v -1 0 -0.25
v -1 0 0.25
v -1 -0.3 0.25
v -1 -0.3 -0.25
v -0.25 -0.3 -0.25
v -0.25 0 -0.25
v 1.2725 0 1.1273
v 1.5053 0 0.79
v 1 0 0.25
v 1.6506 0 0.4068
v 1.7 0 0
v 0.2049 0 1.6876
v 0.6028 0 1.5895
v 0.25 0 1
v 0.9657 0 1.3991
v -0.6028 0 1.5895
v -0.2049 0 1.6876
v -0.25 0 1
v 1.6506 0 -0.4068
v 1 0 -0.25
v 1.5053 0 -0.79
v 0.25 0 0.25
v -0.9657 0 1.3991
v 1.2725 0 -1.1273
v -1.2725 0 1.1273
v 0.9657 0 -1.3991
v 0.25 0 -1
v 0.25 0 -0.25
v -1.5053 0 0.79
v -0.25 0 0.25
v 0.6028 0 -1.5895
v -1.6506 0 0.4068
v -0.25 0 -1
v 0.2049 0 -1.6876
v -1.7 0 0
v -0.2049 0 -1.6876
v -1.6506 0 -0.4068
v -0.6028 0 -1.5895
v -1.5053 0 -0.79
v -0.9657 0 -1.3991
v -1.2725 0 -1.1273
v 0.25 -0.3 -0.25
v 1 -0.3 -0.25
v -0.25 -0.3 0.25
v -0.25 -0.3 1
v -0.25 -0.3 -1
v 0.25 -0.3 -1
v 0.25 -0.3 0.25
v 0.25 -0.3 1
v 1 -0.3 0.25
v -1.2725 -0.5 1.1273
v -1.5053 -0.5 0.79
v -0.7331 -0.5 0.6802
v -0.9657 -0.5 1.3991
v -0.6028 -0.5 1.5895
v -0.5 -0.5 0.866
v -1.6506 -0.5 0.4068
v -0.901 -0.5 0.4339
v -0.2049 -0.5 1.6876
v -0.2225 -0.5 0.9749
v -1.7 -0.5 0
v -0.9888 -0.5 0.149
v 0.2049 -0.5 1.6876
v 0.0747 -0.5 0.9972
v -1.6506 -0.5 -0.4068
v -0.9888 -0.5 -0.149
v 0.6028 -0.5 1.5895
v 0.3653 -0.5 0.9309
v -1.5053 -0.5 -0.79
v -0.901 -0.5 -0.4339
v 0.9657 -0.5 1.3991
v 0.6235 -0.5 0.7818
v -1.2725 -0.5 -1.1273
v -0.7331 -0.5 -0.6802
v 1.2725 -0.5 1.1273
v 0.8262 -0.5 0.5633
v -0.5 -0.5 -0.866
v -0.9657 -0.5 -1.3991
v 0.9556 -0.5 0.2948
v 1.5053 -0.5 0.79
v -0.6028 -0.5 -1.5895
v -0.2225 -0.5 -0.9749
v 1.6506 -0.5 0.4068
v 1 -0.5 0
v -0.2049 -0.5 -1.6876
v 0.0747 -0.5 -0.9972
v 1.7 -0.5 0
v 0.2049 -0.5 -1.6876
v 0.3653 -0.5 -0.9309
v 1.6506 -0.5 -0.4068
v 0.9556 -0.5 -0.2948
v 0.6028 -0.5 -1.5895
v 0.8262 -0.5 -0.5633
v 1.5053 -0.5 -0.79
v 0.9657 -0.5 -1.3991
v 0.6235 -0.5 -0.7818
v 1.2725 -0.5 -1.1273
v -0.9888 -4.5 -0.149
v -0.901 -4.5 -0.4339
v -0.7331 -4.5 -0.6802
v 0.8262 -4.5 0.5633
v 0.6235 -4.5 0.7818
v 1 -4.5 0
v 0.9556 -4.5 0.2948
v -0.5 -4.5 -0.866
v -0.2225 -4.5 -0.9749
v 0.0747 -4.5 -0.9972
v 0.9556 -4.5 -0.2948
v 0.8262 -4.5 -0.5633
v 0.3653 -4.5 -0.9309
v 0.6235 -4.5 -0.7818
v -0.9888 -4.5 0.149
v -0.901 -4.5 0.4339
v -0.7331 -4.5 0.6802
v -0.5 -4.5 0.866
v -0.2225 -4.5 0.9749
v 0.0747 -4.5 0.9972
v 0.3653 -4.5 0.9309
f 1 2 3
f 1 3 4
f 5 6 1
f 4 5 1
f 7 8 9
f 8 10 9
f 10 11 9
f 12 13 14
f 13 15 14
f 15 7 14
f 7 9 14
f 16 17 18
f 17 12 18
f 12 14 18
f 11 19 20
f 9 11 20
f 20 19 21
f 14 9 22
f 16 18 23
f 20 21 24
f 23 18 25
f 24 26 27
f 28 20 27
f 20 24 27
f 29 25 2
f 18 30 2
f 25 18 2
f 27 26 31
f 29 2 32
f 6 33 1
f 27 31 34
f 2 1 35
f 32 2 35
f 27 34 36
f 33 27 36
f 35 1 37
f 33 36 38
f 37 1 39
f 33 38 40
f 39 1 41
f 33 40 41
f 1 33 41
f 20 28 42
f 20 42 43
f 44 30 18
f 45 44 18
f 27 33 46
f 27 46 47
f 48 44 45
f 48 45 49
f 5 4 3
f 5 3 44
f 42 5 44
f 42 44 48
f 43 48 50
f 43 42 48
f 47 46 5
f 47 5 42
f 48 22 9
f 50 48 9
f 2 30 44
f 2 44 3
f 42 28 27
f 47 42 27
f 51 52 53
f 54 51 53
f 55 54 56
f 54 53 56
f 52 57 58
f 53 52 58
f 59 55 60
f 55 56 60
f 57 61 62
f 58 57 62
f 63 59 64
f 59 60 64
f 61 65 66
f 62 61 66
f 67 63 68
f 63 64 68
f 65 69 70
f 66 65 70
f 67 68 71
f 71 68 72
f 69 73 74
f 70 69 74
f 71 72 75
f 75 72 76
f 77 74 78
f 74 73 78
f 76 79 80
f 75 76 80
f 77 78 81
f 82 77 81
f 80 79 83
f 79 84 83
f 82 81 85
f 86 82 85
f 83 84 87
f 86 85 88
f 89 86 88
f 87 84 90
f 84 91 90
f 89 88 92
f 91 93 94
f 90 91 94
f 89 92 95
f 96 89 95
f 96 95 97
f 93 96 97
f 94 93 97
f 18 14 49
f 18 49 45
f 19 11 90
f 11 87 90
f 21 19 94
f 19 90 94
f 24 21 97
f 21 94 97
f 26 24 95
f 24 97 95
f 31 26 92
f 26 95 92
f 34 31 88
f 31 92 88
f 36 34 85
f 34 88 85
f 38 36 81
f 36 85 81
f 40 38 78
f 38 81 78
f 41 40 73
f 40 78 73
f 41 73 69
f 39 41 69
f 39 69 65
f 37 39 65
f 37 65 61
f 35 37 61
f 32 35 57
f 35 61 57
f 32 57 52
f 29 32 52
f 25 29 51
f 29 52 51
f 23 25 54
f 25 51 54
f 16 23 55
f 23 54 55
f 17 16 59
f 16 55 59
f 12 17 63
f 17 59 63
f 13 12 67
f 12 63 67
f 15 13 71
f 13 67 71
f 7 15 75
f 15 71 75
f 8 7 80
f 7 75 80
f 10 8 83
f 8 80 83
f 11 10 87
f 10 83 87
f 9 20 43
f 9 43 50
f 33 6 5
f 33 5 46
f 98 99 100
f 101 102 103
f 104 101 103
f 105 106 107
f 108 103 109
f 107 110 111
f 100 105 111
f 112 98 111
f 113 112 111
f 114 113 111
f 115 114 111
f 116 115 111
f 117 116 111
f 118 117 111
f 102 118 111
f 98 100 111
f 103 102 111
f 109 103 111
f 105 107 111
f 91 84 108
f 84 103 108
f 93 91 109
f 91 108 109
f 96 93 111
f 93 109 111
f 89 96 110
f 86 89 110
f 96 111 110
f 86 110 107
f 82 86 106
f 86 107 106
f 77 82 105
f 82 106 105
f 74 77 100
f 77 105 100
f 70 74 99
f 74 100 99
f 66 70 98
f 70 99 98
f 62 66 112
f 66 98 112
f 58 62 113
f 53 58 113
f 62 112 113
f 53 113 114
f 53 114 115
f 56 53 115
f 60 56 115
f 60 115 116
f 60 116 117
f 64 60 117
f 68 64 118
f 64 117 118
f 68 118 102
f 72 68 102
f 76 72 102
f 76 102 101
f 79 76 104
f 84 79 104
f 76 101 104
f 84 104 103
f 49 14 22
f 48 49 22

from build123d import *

# Parameters (mm, degrees)
SKETCH_2_W               = 0.5
SKETCH_2_H               = 1
CUT_EXTRUDE_1_DEPTH      = 0.3
PATTERN_CIRCULAR_1_COUNT = 4


with BuildPart() as part:
    # ｽｹｯﾁ1 → 回転1 (revolve)
    with BuildSketch(Plane.XY):
        Polygon((0, 0), (1.7, 0), (1.7, -0.5), (1, -0.5), (1, -4.5), (0, -4.5), align=None)
    revolve(axis=Axis((0, -4.5, 0), (0, 1, 0)))

    # ｽｹｯﾁ2 → ｶｯﾄ - 押し出し1 (cut)
    with BuildSketch(Plane(origin=(0, 0, 0), x_dir=(1, 0, 0), z_dir=(0, 1, 0))):
        with Locations((0, 0.5)):
            Rectangle(SKETCH_2_W, SKETCH_2_H)
    cut_extrude_1 = extrude(amount=-CUT_EXTRUDE_1_DEPTH, mode=Mode.SUBTRACT)

    # 円形ﾊﾟﾀｰﾝ1: ｶｯﾄ - 押し出し1 ×4 about axis
    pattern_circular_1_axis = Axis((0, 0, 0), (0, 1, 0))
    for i in range(1, PATTERN_CIRCULAR_1_COUNT):
        add(cut_extrude_1.rotate(pattern_circular_1_axis, i * 360 / PATTERN_CIRCULAR_1_COUNT), mode=Mode.SUBTRACT)


solid = part.part
